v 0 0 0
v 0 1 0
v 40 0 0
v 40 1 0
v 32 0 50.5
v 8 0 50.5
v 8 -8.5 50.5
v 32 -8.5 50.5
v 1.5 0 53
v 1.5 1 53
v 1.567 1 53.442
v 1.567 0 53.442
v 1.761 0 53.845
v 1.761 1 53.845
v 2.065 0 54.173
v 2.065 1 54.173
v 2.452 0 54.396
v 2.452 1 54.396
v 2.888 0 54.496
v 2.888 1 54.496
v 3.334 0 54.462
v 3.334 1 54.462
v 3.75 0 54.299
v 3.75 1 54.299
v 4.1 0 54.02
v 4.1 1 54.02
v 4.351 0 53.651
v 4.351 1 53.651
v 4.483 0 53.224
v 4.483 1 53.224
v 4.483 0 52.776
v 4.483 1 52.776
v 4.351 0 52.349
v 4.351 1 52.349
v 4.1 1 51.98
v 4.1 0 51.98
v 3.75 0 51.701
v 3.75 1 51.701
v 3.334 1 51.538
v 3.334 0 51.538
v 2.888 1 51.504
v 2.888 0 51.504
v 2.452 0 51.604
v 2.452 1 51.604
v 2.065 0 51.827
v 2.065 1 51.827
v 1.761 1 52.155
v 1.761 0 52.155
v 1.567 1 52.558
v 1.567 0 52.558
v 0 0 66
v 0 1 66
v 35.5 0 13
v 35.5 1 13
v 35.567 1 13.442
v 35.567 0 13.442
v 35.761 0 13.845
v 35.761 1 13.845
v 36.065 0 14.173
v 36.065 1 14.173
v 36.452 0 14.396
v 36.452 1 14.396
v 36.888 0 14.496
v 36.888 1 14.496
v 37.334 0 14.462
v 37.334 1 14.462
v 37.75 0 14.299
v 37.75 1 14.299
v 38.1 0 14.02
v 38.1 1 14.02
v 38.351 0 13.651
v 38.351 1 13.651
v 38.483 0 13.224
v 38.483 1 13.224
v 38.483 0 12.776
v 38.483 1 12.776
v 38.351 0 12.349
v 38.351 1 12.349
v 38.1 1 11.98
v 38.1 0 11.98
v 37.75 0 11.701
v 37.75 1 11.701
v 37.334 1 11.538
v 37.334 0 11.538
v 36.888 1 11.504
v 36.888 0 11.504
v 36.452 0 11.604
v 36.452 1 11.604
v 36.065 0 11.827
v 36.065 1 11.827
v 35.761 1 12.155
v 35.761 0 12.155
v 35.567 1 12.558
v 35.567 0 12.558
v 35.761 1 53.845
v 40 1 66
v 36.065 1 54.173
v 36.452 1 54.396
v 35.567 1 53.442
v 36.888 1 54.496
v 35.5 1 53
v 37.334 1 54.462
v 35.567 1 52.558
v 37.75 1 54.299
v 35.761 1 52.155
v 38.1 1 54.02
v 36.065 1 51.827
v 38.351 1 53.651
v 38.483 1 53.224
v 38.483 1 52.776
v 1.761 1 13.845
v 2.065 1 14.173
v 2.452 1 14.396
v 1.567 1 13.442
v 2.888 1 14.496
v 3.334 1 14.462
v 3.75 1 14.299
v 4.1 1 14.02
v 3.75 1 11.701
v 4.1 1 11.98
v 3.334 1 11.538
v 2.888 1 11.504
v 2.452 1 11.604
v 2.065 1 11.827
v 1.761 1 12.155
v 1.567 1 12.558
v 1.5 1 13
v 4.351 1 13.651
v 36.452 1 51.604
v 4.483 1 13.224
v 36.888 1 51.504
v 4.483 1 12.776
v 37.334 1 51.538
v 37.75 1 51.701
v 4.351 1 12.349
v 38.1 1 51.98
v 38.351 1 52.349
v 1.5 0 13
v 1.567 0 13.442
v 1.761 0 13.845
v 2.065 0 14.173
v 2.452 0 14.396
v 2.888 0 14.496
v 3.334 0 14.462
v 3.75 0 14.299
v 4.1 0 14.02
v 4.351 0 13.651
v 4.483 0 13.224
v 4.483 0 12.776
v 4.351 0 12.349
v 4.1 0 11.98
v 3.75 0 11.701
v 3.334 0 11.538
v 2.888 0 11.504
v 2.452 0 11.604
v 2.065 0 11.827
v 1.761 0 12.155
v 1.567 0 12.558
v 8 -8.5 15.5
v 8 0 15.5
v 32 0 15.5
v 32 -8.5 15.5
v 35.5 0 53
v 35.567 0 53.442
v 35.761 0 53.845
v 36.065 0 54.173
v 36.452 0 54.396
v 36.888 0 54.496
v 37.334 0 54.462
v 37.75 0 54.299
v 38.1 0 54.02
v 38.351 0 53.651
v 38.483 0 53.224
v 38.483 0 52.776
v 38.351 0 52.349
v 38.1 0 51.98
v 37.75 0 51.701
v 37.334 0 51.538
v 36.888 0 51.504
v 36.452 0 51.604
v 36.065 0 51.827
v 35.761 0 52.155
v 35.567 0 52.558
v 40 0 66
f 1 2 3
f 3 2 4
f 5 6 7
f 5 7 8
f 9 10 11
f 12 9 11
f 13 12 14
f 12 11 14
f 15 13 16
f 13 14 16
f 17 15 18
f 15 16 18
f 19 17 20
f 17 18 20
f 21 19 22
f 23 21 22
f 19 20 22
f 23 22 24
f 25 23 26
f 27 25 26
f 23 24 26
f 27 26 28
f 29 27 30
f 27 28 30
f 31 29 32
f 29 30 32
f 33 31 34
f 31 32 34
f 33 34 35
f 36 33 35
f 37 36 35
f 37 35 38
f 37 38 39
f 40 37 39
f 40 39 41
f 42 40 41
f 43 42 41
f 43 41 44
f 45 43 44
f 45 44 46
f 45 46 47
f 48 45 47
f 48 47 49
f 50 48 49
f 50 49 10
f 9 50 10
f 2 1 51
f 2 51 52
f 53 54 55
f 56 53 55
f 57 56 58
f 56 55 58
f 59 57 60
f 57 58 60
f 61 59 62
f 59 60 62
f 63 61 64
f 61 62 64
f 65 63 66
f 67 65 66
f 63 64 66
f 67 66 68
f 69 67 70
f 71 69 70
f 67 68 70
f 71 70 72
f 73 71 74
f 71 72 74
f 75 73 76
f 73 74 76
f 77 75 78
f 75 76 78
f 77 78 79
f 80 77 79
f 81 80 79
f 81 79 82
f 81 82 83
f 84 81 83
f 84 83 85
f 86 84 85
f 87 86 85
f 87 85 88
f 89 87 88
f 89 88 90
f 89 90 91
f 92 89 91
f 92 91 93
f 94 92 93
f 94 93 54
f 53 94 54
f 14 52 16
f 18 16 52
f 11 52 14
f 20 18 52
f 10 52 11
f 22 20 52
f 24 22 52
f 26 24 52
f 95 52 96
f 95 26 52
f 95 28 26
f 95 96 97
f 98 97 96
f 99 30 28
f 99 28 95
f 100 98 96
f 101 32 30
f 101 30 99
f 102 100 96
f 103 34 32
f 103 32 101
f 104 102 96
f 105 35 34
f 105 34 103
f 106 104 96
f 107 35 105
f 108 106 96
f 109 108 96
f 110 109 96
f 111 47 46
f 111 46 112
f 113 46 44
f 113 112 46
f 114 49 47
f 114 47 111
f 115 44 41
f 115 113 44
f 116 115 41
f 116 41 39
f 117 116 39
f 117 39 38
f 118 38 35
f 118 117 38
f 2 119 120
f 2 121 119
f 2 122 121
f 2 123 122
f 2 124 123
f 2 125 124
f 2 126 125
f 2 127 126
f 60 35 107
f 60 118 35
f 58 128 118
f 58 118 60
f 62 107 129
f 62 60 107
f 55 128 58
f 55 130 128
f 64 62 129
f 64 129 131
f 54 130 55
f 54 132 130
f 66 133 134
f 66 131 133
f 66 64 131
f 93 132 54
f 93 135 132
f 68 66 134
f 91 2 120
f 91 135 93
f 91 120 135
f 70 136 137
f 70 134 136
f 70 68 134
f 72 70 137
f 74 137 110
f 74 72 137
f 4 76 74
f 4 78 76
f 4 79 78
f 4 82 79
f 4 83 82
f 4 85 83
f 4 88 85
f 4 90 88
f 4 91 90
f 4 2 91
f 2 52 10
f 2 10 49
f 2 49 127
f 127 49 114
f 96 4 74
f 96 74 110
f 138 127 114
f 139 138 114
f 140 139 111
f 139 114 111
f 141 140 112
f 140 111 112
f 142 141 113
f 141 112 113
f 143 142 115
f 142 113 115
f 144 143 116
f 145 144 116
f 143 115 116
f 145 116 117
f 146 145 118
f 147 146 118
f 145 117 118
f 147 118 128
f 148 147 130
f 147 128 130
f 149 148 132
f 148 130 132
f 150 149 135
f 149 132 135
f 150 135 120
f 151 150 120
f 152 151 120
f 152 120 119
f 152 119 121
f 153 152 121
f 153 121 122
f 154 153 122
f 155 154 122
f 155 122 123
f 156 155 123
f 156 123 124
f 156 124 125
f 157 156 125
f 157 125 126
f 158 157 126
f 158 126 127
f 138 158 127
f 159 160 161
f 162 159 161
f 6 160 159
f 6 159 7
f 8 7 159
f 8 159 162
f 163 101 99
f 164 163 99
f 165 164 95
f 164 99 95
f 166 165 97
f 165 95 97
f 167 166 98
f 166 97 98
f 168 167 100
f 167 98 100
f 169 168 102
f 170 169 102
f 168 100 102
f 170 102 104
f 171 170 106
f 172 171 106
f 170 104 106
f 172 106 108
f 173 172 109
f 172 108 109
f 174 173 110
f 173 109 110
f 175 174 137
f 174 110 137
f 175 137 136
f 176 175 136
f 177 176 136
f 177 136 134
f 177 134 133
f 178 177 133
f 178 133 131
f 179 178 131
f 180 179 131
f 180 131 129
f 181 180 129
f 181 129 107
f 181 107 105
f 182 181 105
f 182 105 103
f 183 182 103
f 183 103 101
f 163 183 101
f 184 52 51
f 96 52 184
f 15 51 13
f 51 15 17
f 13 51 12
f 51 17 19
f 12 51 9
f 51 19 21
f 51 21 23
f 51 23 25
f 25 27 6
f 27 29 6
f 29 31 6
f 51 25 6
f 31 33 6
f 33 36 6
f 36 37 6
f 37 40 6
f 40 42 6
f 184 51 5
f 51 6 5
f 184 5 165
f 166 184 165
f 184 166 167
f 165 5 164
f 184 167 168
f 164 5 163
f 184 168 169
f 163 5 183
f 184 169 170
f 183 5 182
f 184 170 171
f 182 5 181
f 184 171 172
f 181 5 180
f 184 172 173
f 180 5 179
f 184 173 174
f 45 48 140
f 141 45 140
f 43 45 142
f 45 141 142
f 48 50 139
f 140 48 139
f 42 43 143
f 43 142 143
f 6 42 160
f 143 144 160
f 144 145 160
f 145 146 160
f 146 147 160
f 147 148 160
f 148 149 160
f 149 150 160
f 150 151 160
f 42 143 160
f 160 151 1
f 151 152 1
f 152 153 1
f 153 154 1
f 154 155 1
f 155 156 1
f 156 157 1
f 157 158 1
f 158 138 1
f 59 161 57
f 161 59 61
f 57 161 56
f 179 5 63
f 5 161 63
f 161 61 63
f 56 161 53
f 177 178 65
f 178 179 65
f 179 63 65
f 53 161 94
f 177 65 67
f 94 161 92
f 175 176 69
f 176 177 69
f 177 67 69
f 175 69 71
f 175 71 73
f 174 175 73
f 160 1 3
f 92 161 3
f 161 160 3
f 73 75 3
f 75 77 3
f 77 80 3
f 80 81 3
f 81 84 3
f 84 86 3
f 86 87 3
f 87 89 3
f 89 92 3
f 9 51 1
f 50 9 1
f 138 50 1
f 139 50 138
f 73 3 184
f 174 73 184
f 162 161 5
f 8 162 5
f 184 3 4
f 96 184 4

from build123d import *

# Parameters (mm, degrees)
SKETCH_1_W          = 40
SKETCH_1_H          = 1
EXTRUDE_1_DEPTH     = 66
SKETCH_2_W          = 24
SKETCH_2_H          = 35
EXTRUDE_2_DEPTH     = 8.5
SKETCH_3_R          = 1.5
CUT_EXTRUDE_1_DEPTH = 78.757636281


with BuildPart() as part:
    # ｽｹｯﾁ1 → ﾎﾞｽ - 押し出し1 (new body)
    with BuildSketch(Plane.XY):
        with Locations((20, 0.5)):
            Rectangle(SKETCH_1_W, SKETCH_1_H)
    extrude(amount=EXTRUDE_1_DEPTH)

    # ｽｹｯﾁ2 → ﾎﾞｽ - 押し出し2 (add)
    with BuildSketch(Plane.XZ):
        with Locations((20, 33)):
            Rectangle(SKETCH_2_W, SKETCH_2_H)
    extrude(amount=EXTRUDE_2_DEPTH)

    # ｽｹｯﾁ3 → ｶｯﾄ - 押し出し1 (cut, through all)
    with BuildSketch(Plane(origin=(0, 1, 0), x_dir=(1, 0, 0), z_dir=(0, 1, 0))):
        with Locations(Location((3, -13, 0), (0, 0, 180))):
            Circle(SKETCH_3_R)
        with Locations(Location((37, -13, 0), (0, 0, 180))):
            Circle(SKETCH_3_R)
        with Locations(Location((3, -53, 0), (0, 0, 180))):
            Circle(SKETCH_3_R)
        with Locations(Location((37, -53, 0), (0, 0, 180))):
            Circle(SKETCH_3_R)
    extrude(amount=-CUT_EXTRUDE_1_DEPTH, mode=Mode.SUBTRACT)


solid = part.part
